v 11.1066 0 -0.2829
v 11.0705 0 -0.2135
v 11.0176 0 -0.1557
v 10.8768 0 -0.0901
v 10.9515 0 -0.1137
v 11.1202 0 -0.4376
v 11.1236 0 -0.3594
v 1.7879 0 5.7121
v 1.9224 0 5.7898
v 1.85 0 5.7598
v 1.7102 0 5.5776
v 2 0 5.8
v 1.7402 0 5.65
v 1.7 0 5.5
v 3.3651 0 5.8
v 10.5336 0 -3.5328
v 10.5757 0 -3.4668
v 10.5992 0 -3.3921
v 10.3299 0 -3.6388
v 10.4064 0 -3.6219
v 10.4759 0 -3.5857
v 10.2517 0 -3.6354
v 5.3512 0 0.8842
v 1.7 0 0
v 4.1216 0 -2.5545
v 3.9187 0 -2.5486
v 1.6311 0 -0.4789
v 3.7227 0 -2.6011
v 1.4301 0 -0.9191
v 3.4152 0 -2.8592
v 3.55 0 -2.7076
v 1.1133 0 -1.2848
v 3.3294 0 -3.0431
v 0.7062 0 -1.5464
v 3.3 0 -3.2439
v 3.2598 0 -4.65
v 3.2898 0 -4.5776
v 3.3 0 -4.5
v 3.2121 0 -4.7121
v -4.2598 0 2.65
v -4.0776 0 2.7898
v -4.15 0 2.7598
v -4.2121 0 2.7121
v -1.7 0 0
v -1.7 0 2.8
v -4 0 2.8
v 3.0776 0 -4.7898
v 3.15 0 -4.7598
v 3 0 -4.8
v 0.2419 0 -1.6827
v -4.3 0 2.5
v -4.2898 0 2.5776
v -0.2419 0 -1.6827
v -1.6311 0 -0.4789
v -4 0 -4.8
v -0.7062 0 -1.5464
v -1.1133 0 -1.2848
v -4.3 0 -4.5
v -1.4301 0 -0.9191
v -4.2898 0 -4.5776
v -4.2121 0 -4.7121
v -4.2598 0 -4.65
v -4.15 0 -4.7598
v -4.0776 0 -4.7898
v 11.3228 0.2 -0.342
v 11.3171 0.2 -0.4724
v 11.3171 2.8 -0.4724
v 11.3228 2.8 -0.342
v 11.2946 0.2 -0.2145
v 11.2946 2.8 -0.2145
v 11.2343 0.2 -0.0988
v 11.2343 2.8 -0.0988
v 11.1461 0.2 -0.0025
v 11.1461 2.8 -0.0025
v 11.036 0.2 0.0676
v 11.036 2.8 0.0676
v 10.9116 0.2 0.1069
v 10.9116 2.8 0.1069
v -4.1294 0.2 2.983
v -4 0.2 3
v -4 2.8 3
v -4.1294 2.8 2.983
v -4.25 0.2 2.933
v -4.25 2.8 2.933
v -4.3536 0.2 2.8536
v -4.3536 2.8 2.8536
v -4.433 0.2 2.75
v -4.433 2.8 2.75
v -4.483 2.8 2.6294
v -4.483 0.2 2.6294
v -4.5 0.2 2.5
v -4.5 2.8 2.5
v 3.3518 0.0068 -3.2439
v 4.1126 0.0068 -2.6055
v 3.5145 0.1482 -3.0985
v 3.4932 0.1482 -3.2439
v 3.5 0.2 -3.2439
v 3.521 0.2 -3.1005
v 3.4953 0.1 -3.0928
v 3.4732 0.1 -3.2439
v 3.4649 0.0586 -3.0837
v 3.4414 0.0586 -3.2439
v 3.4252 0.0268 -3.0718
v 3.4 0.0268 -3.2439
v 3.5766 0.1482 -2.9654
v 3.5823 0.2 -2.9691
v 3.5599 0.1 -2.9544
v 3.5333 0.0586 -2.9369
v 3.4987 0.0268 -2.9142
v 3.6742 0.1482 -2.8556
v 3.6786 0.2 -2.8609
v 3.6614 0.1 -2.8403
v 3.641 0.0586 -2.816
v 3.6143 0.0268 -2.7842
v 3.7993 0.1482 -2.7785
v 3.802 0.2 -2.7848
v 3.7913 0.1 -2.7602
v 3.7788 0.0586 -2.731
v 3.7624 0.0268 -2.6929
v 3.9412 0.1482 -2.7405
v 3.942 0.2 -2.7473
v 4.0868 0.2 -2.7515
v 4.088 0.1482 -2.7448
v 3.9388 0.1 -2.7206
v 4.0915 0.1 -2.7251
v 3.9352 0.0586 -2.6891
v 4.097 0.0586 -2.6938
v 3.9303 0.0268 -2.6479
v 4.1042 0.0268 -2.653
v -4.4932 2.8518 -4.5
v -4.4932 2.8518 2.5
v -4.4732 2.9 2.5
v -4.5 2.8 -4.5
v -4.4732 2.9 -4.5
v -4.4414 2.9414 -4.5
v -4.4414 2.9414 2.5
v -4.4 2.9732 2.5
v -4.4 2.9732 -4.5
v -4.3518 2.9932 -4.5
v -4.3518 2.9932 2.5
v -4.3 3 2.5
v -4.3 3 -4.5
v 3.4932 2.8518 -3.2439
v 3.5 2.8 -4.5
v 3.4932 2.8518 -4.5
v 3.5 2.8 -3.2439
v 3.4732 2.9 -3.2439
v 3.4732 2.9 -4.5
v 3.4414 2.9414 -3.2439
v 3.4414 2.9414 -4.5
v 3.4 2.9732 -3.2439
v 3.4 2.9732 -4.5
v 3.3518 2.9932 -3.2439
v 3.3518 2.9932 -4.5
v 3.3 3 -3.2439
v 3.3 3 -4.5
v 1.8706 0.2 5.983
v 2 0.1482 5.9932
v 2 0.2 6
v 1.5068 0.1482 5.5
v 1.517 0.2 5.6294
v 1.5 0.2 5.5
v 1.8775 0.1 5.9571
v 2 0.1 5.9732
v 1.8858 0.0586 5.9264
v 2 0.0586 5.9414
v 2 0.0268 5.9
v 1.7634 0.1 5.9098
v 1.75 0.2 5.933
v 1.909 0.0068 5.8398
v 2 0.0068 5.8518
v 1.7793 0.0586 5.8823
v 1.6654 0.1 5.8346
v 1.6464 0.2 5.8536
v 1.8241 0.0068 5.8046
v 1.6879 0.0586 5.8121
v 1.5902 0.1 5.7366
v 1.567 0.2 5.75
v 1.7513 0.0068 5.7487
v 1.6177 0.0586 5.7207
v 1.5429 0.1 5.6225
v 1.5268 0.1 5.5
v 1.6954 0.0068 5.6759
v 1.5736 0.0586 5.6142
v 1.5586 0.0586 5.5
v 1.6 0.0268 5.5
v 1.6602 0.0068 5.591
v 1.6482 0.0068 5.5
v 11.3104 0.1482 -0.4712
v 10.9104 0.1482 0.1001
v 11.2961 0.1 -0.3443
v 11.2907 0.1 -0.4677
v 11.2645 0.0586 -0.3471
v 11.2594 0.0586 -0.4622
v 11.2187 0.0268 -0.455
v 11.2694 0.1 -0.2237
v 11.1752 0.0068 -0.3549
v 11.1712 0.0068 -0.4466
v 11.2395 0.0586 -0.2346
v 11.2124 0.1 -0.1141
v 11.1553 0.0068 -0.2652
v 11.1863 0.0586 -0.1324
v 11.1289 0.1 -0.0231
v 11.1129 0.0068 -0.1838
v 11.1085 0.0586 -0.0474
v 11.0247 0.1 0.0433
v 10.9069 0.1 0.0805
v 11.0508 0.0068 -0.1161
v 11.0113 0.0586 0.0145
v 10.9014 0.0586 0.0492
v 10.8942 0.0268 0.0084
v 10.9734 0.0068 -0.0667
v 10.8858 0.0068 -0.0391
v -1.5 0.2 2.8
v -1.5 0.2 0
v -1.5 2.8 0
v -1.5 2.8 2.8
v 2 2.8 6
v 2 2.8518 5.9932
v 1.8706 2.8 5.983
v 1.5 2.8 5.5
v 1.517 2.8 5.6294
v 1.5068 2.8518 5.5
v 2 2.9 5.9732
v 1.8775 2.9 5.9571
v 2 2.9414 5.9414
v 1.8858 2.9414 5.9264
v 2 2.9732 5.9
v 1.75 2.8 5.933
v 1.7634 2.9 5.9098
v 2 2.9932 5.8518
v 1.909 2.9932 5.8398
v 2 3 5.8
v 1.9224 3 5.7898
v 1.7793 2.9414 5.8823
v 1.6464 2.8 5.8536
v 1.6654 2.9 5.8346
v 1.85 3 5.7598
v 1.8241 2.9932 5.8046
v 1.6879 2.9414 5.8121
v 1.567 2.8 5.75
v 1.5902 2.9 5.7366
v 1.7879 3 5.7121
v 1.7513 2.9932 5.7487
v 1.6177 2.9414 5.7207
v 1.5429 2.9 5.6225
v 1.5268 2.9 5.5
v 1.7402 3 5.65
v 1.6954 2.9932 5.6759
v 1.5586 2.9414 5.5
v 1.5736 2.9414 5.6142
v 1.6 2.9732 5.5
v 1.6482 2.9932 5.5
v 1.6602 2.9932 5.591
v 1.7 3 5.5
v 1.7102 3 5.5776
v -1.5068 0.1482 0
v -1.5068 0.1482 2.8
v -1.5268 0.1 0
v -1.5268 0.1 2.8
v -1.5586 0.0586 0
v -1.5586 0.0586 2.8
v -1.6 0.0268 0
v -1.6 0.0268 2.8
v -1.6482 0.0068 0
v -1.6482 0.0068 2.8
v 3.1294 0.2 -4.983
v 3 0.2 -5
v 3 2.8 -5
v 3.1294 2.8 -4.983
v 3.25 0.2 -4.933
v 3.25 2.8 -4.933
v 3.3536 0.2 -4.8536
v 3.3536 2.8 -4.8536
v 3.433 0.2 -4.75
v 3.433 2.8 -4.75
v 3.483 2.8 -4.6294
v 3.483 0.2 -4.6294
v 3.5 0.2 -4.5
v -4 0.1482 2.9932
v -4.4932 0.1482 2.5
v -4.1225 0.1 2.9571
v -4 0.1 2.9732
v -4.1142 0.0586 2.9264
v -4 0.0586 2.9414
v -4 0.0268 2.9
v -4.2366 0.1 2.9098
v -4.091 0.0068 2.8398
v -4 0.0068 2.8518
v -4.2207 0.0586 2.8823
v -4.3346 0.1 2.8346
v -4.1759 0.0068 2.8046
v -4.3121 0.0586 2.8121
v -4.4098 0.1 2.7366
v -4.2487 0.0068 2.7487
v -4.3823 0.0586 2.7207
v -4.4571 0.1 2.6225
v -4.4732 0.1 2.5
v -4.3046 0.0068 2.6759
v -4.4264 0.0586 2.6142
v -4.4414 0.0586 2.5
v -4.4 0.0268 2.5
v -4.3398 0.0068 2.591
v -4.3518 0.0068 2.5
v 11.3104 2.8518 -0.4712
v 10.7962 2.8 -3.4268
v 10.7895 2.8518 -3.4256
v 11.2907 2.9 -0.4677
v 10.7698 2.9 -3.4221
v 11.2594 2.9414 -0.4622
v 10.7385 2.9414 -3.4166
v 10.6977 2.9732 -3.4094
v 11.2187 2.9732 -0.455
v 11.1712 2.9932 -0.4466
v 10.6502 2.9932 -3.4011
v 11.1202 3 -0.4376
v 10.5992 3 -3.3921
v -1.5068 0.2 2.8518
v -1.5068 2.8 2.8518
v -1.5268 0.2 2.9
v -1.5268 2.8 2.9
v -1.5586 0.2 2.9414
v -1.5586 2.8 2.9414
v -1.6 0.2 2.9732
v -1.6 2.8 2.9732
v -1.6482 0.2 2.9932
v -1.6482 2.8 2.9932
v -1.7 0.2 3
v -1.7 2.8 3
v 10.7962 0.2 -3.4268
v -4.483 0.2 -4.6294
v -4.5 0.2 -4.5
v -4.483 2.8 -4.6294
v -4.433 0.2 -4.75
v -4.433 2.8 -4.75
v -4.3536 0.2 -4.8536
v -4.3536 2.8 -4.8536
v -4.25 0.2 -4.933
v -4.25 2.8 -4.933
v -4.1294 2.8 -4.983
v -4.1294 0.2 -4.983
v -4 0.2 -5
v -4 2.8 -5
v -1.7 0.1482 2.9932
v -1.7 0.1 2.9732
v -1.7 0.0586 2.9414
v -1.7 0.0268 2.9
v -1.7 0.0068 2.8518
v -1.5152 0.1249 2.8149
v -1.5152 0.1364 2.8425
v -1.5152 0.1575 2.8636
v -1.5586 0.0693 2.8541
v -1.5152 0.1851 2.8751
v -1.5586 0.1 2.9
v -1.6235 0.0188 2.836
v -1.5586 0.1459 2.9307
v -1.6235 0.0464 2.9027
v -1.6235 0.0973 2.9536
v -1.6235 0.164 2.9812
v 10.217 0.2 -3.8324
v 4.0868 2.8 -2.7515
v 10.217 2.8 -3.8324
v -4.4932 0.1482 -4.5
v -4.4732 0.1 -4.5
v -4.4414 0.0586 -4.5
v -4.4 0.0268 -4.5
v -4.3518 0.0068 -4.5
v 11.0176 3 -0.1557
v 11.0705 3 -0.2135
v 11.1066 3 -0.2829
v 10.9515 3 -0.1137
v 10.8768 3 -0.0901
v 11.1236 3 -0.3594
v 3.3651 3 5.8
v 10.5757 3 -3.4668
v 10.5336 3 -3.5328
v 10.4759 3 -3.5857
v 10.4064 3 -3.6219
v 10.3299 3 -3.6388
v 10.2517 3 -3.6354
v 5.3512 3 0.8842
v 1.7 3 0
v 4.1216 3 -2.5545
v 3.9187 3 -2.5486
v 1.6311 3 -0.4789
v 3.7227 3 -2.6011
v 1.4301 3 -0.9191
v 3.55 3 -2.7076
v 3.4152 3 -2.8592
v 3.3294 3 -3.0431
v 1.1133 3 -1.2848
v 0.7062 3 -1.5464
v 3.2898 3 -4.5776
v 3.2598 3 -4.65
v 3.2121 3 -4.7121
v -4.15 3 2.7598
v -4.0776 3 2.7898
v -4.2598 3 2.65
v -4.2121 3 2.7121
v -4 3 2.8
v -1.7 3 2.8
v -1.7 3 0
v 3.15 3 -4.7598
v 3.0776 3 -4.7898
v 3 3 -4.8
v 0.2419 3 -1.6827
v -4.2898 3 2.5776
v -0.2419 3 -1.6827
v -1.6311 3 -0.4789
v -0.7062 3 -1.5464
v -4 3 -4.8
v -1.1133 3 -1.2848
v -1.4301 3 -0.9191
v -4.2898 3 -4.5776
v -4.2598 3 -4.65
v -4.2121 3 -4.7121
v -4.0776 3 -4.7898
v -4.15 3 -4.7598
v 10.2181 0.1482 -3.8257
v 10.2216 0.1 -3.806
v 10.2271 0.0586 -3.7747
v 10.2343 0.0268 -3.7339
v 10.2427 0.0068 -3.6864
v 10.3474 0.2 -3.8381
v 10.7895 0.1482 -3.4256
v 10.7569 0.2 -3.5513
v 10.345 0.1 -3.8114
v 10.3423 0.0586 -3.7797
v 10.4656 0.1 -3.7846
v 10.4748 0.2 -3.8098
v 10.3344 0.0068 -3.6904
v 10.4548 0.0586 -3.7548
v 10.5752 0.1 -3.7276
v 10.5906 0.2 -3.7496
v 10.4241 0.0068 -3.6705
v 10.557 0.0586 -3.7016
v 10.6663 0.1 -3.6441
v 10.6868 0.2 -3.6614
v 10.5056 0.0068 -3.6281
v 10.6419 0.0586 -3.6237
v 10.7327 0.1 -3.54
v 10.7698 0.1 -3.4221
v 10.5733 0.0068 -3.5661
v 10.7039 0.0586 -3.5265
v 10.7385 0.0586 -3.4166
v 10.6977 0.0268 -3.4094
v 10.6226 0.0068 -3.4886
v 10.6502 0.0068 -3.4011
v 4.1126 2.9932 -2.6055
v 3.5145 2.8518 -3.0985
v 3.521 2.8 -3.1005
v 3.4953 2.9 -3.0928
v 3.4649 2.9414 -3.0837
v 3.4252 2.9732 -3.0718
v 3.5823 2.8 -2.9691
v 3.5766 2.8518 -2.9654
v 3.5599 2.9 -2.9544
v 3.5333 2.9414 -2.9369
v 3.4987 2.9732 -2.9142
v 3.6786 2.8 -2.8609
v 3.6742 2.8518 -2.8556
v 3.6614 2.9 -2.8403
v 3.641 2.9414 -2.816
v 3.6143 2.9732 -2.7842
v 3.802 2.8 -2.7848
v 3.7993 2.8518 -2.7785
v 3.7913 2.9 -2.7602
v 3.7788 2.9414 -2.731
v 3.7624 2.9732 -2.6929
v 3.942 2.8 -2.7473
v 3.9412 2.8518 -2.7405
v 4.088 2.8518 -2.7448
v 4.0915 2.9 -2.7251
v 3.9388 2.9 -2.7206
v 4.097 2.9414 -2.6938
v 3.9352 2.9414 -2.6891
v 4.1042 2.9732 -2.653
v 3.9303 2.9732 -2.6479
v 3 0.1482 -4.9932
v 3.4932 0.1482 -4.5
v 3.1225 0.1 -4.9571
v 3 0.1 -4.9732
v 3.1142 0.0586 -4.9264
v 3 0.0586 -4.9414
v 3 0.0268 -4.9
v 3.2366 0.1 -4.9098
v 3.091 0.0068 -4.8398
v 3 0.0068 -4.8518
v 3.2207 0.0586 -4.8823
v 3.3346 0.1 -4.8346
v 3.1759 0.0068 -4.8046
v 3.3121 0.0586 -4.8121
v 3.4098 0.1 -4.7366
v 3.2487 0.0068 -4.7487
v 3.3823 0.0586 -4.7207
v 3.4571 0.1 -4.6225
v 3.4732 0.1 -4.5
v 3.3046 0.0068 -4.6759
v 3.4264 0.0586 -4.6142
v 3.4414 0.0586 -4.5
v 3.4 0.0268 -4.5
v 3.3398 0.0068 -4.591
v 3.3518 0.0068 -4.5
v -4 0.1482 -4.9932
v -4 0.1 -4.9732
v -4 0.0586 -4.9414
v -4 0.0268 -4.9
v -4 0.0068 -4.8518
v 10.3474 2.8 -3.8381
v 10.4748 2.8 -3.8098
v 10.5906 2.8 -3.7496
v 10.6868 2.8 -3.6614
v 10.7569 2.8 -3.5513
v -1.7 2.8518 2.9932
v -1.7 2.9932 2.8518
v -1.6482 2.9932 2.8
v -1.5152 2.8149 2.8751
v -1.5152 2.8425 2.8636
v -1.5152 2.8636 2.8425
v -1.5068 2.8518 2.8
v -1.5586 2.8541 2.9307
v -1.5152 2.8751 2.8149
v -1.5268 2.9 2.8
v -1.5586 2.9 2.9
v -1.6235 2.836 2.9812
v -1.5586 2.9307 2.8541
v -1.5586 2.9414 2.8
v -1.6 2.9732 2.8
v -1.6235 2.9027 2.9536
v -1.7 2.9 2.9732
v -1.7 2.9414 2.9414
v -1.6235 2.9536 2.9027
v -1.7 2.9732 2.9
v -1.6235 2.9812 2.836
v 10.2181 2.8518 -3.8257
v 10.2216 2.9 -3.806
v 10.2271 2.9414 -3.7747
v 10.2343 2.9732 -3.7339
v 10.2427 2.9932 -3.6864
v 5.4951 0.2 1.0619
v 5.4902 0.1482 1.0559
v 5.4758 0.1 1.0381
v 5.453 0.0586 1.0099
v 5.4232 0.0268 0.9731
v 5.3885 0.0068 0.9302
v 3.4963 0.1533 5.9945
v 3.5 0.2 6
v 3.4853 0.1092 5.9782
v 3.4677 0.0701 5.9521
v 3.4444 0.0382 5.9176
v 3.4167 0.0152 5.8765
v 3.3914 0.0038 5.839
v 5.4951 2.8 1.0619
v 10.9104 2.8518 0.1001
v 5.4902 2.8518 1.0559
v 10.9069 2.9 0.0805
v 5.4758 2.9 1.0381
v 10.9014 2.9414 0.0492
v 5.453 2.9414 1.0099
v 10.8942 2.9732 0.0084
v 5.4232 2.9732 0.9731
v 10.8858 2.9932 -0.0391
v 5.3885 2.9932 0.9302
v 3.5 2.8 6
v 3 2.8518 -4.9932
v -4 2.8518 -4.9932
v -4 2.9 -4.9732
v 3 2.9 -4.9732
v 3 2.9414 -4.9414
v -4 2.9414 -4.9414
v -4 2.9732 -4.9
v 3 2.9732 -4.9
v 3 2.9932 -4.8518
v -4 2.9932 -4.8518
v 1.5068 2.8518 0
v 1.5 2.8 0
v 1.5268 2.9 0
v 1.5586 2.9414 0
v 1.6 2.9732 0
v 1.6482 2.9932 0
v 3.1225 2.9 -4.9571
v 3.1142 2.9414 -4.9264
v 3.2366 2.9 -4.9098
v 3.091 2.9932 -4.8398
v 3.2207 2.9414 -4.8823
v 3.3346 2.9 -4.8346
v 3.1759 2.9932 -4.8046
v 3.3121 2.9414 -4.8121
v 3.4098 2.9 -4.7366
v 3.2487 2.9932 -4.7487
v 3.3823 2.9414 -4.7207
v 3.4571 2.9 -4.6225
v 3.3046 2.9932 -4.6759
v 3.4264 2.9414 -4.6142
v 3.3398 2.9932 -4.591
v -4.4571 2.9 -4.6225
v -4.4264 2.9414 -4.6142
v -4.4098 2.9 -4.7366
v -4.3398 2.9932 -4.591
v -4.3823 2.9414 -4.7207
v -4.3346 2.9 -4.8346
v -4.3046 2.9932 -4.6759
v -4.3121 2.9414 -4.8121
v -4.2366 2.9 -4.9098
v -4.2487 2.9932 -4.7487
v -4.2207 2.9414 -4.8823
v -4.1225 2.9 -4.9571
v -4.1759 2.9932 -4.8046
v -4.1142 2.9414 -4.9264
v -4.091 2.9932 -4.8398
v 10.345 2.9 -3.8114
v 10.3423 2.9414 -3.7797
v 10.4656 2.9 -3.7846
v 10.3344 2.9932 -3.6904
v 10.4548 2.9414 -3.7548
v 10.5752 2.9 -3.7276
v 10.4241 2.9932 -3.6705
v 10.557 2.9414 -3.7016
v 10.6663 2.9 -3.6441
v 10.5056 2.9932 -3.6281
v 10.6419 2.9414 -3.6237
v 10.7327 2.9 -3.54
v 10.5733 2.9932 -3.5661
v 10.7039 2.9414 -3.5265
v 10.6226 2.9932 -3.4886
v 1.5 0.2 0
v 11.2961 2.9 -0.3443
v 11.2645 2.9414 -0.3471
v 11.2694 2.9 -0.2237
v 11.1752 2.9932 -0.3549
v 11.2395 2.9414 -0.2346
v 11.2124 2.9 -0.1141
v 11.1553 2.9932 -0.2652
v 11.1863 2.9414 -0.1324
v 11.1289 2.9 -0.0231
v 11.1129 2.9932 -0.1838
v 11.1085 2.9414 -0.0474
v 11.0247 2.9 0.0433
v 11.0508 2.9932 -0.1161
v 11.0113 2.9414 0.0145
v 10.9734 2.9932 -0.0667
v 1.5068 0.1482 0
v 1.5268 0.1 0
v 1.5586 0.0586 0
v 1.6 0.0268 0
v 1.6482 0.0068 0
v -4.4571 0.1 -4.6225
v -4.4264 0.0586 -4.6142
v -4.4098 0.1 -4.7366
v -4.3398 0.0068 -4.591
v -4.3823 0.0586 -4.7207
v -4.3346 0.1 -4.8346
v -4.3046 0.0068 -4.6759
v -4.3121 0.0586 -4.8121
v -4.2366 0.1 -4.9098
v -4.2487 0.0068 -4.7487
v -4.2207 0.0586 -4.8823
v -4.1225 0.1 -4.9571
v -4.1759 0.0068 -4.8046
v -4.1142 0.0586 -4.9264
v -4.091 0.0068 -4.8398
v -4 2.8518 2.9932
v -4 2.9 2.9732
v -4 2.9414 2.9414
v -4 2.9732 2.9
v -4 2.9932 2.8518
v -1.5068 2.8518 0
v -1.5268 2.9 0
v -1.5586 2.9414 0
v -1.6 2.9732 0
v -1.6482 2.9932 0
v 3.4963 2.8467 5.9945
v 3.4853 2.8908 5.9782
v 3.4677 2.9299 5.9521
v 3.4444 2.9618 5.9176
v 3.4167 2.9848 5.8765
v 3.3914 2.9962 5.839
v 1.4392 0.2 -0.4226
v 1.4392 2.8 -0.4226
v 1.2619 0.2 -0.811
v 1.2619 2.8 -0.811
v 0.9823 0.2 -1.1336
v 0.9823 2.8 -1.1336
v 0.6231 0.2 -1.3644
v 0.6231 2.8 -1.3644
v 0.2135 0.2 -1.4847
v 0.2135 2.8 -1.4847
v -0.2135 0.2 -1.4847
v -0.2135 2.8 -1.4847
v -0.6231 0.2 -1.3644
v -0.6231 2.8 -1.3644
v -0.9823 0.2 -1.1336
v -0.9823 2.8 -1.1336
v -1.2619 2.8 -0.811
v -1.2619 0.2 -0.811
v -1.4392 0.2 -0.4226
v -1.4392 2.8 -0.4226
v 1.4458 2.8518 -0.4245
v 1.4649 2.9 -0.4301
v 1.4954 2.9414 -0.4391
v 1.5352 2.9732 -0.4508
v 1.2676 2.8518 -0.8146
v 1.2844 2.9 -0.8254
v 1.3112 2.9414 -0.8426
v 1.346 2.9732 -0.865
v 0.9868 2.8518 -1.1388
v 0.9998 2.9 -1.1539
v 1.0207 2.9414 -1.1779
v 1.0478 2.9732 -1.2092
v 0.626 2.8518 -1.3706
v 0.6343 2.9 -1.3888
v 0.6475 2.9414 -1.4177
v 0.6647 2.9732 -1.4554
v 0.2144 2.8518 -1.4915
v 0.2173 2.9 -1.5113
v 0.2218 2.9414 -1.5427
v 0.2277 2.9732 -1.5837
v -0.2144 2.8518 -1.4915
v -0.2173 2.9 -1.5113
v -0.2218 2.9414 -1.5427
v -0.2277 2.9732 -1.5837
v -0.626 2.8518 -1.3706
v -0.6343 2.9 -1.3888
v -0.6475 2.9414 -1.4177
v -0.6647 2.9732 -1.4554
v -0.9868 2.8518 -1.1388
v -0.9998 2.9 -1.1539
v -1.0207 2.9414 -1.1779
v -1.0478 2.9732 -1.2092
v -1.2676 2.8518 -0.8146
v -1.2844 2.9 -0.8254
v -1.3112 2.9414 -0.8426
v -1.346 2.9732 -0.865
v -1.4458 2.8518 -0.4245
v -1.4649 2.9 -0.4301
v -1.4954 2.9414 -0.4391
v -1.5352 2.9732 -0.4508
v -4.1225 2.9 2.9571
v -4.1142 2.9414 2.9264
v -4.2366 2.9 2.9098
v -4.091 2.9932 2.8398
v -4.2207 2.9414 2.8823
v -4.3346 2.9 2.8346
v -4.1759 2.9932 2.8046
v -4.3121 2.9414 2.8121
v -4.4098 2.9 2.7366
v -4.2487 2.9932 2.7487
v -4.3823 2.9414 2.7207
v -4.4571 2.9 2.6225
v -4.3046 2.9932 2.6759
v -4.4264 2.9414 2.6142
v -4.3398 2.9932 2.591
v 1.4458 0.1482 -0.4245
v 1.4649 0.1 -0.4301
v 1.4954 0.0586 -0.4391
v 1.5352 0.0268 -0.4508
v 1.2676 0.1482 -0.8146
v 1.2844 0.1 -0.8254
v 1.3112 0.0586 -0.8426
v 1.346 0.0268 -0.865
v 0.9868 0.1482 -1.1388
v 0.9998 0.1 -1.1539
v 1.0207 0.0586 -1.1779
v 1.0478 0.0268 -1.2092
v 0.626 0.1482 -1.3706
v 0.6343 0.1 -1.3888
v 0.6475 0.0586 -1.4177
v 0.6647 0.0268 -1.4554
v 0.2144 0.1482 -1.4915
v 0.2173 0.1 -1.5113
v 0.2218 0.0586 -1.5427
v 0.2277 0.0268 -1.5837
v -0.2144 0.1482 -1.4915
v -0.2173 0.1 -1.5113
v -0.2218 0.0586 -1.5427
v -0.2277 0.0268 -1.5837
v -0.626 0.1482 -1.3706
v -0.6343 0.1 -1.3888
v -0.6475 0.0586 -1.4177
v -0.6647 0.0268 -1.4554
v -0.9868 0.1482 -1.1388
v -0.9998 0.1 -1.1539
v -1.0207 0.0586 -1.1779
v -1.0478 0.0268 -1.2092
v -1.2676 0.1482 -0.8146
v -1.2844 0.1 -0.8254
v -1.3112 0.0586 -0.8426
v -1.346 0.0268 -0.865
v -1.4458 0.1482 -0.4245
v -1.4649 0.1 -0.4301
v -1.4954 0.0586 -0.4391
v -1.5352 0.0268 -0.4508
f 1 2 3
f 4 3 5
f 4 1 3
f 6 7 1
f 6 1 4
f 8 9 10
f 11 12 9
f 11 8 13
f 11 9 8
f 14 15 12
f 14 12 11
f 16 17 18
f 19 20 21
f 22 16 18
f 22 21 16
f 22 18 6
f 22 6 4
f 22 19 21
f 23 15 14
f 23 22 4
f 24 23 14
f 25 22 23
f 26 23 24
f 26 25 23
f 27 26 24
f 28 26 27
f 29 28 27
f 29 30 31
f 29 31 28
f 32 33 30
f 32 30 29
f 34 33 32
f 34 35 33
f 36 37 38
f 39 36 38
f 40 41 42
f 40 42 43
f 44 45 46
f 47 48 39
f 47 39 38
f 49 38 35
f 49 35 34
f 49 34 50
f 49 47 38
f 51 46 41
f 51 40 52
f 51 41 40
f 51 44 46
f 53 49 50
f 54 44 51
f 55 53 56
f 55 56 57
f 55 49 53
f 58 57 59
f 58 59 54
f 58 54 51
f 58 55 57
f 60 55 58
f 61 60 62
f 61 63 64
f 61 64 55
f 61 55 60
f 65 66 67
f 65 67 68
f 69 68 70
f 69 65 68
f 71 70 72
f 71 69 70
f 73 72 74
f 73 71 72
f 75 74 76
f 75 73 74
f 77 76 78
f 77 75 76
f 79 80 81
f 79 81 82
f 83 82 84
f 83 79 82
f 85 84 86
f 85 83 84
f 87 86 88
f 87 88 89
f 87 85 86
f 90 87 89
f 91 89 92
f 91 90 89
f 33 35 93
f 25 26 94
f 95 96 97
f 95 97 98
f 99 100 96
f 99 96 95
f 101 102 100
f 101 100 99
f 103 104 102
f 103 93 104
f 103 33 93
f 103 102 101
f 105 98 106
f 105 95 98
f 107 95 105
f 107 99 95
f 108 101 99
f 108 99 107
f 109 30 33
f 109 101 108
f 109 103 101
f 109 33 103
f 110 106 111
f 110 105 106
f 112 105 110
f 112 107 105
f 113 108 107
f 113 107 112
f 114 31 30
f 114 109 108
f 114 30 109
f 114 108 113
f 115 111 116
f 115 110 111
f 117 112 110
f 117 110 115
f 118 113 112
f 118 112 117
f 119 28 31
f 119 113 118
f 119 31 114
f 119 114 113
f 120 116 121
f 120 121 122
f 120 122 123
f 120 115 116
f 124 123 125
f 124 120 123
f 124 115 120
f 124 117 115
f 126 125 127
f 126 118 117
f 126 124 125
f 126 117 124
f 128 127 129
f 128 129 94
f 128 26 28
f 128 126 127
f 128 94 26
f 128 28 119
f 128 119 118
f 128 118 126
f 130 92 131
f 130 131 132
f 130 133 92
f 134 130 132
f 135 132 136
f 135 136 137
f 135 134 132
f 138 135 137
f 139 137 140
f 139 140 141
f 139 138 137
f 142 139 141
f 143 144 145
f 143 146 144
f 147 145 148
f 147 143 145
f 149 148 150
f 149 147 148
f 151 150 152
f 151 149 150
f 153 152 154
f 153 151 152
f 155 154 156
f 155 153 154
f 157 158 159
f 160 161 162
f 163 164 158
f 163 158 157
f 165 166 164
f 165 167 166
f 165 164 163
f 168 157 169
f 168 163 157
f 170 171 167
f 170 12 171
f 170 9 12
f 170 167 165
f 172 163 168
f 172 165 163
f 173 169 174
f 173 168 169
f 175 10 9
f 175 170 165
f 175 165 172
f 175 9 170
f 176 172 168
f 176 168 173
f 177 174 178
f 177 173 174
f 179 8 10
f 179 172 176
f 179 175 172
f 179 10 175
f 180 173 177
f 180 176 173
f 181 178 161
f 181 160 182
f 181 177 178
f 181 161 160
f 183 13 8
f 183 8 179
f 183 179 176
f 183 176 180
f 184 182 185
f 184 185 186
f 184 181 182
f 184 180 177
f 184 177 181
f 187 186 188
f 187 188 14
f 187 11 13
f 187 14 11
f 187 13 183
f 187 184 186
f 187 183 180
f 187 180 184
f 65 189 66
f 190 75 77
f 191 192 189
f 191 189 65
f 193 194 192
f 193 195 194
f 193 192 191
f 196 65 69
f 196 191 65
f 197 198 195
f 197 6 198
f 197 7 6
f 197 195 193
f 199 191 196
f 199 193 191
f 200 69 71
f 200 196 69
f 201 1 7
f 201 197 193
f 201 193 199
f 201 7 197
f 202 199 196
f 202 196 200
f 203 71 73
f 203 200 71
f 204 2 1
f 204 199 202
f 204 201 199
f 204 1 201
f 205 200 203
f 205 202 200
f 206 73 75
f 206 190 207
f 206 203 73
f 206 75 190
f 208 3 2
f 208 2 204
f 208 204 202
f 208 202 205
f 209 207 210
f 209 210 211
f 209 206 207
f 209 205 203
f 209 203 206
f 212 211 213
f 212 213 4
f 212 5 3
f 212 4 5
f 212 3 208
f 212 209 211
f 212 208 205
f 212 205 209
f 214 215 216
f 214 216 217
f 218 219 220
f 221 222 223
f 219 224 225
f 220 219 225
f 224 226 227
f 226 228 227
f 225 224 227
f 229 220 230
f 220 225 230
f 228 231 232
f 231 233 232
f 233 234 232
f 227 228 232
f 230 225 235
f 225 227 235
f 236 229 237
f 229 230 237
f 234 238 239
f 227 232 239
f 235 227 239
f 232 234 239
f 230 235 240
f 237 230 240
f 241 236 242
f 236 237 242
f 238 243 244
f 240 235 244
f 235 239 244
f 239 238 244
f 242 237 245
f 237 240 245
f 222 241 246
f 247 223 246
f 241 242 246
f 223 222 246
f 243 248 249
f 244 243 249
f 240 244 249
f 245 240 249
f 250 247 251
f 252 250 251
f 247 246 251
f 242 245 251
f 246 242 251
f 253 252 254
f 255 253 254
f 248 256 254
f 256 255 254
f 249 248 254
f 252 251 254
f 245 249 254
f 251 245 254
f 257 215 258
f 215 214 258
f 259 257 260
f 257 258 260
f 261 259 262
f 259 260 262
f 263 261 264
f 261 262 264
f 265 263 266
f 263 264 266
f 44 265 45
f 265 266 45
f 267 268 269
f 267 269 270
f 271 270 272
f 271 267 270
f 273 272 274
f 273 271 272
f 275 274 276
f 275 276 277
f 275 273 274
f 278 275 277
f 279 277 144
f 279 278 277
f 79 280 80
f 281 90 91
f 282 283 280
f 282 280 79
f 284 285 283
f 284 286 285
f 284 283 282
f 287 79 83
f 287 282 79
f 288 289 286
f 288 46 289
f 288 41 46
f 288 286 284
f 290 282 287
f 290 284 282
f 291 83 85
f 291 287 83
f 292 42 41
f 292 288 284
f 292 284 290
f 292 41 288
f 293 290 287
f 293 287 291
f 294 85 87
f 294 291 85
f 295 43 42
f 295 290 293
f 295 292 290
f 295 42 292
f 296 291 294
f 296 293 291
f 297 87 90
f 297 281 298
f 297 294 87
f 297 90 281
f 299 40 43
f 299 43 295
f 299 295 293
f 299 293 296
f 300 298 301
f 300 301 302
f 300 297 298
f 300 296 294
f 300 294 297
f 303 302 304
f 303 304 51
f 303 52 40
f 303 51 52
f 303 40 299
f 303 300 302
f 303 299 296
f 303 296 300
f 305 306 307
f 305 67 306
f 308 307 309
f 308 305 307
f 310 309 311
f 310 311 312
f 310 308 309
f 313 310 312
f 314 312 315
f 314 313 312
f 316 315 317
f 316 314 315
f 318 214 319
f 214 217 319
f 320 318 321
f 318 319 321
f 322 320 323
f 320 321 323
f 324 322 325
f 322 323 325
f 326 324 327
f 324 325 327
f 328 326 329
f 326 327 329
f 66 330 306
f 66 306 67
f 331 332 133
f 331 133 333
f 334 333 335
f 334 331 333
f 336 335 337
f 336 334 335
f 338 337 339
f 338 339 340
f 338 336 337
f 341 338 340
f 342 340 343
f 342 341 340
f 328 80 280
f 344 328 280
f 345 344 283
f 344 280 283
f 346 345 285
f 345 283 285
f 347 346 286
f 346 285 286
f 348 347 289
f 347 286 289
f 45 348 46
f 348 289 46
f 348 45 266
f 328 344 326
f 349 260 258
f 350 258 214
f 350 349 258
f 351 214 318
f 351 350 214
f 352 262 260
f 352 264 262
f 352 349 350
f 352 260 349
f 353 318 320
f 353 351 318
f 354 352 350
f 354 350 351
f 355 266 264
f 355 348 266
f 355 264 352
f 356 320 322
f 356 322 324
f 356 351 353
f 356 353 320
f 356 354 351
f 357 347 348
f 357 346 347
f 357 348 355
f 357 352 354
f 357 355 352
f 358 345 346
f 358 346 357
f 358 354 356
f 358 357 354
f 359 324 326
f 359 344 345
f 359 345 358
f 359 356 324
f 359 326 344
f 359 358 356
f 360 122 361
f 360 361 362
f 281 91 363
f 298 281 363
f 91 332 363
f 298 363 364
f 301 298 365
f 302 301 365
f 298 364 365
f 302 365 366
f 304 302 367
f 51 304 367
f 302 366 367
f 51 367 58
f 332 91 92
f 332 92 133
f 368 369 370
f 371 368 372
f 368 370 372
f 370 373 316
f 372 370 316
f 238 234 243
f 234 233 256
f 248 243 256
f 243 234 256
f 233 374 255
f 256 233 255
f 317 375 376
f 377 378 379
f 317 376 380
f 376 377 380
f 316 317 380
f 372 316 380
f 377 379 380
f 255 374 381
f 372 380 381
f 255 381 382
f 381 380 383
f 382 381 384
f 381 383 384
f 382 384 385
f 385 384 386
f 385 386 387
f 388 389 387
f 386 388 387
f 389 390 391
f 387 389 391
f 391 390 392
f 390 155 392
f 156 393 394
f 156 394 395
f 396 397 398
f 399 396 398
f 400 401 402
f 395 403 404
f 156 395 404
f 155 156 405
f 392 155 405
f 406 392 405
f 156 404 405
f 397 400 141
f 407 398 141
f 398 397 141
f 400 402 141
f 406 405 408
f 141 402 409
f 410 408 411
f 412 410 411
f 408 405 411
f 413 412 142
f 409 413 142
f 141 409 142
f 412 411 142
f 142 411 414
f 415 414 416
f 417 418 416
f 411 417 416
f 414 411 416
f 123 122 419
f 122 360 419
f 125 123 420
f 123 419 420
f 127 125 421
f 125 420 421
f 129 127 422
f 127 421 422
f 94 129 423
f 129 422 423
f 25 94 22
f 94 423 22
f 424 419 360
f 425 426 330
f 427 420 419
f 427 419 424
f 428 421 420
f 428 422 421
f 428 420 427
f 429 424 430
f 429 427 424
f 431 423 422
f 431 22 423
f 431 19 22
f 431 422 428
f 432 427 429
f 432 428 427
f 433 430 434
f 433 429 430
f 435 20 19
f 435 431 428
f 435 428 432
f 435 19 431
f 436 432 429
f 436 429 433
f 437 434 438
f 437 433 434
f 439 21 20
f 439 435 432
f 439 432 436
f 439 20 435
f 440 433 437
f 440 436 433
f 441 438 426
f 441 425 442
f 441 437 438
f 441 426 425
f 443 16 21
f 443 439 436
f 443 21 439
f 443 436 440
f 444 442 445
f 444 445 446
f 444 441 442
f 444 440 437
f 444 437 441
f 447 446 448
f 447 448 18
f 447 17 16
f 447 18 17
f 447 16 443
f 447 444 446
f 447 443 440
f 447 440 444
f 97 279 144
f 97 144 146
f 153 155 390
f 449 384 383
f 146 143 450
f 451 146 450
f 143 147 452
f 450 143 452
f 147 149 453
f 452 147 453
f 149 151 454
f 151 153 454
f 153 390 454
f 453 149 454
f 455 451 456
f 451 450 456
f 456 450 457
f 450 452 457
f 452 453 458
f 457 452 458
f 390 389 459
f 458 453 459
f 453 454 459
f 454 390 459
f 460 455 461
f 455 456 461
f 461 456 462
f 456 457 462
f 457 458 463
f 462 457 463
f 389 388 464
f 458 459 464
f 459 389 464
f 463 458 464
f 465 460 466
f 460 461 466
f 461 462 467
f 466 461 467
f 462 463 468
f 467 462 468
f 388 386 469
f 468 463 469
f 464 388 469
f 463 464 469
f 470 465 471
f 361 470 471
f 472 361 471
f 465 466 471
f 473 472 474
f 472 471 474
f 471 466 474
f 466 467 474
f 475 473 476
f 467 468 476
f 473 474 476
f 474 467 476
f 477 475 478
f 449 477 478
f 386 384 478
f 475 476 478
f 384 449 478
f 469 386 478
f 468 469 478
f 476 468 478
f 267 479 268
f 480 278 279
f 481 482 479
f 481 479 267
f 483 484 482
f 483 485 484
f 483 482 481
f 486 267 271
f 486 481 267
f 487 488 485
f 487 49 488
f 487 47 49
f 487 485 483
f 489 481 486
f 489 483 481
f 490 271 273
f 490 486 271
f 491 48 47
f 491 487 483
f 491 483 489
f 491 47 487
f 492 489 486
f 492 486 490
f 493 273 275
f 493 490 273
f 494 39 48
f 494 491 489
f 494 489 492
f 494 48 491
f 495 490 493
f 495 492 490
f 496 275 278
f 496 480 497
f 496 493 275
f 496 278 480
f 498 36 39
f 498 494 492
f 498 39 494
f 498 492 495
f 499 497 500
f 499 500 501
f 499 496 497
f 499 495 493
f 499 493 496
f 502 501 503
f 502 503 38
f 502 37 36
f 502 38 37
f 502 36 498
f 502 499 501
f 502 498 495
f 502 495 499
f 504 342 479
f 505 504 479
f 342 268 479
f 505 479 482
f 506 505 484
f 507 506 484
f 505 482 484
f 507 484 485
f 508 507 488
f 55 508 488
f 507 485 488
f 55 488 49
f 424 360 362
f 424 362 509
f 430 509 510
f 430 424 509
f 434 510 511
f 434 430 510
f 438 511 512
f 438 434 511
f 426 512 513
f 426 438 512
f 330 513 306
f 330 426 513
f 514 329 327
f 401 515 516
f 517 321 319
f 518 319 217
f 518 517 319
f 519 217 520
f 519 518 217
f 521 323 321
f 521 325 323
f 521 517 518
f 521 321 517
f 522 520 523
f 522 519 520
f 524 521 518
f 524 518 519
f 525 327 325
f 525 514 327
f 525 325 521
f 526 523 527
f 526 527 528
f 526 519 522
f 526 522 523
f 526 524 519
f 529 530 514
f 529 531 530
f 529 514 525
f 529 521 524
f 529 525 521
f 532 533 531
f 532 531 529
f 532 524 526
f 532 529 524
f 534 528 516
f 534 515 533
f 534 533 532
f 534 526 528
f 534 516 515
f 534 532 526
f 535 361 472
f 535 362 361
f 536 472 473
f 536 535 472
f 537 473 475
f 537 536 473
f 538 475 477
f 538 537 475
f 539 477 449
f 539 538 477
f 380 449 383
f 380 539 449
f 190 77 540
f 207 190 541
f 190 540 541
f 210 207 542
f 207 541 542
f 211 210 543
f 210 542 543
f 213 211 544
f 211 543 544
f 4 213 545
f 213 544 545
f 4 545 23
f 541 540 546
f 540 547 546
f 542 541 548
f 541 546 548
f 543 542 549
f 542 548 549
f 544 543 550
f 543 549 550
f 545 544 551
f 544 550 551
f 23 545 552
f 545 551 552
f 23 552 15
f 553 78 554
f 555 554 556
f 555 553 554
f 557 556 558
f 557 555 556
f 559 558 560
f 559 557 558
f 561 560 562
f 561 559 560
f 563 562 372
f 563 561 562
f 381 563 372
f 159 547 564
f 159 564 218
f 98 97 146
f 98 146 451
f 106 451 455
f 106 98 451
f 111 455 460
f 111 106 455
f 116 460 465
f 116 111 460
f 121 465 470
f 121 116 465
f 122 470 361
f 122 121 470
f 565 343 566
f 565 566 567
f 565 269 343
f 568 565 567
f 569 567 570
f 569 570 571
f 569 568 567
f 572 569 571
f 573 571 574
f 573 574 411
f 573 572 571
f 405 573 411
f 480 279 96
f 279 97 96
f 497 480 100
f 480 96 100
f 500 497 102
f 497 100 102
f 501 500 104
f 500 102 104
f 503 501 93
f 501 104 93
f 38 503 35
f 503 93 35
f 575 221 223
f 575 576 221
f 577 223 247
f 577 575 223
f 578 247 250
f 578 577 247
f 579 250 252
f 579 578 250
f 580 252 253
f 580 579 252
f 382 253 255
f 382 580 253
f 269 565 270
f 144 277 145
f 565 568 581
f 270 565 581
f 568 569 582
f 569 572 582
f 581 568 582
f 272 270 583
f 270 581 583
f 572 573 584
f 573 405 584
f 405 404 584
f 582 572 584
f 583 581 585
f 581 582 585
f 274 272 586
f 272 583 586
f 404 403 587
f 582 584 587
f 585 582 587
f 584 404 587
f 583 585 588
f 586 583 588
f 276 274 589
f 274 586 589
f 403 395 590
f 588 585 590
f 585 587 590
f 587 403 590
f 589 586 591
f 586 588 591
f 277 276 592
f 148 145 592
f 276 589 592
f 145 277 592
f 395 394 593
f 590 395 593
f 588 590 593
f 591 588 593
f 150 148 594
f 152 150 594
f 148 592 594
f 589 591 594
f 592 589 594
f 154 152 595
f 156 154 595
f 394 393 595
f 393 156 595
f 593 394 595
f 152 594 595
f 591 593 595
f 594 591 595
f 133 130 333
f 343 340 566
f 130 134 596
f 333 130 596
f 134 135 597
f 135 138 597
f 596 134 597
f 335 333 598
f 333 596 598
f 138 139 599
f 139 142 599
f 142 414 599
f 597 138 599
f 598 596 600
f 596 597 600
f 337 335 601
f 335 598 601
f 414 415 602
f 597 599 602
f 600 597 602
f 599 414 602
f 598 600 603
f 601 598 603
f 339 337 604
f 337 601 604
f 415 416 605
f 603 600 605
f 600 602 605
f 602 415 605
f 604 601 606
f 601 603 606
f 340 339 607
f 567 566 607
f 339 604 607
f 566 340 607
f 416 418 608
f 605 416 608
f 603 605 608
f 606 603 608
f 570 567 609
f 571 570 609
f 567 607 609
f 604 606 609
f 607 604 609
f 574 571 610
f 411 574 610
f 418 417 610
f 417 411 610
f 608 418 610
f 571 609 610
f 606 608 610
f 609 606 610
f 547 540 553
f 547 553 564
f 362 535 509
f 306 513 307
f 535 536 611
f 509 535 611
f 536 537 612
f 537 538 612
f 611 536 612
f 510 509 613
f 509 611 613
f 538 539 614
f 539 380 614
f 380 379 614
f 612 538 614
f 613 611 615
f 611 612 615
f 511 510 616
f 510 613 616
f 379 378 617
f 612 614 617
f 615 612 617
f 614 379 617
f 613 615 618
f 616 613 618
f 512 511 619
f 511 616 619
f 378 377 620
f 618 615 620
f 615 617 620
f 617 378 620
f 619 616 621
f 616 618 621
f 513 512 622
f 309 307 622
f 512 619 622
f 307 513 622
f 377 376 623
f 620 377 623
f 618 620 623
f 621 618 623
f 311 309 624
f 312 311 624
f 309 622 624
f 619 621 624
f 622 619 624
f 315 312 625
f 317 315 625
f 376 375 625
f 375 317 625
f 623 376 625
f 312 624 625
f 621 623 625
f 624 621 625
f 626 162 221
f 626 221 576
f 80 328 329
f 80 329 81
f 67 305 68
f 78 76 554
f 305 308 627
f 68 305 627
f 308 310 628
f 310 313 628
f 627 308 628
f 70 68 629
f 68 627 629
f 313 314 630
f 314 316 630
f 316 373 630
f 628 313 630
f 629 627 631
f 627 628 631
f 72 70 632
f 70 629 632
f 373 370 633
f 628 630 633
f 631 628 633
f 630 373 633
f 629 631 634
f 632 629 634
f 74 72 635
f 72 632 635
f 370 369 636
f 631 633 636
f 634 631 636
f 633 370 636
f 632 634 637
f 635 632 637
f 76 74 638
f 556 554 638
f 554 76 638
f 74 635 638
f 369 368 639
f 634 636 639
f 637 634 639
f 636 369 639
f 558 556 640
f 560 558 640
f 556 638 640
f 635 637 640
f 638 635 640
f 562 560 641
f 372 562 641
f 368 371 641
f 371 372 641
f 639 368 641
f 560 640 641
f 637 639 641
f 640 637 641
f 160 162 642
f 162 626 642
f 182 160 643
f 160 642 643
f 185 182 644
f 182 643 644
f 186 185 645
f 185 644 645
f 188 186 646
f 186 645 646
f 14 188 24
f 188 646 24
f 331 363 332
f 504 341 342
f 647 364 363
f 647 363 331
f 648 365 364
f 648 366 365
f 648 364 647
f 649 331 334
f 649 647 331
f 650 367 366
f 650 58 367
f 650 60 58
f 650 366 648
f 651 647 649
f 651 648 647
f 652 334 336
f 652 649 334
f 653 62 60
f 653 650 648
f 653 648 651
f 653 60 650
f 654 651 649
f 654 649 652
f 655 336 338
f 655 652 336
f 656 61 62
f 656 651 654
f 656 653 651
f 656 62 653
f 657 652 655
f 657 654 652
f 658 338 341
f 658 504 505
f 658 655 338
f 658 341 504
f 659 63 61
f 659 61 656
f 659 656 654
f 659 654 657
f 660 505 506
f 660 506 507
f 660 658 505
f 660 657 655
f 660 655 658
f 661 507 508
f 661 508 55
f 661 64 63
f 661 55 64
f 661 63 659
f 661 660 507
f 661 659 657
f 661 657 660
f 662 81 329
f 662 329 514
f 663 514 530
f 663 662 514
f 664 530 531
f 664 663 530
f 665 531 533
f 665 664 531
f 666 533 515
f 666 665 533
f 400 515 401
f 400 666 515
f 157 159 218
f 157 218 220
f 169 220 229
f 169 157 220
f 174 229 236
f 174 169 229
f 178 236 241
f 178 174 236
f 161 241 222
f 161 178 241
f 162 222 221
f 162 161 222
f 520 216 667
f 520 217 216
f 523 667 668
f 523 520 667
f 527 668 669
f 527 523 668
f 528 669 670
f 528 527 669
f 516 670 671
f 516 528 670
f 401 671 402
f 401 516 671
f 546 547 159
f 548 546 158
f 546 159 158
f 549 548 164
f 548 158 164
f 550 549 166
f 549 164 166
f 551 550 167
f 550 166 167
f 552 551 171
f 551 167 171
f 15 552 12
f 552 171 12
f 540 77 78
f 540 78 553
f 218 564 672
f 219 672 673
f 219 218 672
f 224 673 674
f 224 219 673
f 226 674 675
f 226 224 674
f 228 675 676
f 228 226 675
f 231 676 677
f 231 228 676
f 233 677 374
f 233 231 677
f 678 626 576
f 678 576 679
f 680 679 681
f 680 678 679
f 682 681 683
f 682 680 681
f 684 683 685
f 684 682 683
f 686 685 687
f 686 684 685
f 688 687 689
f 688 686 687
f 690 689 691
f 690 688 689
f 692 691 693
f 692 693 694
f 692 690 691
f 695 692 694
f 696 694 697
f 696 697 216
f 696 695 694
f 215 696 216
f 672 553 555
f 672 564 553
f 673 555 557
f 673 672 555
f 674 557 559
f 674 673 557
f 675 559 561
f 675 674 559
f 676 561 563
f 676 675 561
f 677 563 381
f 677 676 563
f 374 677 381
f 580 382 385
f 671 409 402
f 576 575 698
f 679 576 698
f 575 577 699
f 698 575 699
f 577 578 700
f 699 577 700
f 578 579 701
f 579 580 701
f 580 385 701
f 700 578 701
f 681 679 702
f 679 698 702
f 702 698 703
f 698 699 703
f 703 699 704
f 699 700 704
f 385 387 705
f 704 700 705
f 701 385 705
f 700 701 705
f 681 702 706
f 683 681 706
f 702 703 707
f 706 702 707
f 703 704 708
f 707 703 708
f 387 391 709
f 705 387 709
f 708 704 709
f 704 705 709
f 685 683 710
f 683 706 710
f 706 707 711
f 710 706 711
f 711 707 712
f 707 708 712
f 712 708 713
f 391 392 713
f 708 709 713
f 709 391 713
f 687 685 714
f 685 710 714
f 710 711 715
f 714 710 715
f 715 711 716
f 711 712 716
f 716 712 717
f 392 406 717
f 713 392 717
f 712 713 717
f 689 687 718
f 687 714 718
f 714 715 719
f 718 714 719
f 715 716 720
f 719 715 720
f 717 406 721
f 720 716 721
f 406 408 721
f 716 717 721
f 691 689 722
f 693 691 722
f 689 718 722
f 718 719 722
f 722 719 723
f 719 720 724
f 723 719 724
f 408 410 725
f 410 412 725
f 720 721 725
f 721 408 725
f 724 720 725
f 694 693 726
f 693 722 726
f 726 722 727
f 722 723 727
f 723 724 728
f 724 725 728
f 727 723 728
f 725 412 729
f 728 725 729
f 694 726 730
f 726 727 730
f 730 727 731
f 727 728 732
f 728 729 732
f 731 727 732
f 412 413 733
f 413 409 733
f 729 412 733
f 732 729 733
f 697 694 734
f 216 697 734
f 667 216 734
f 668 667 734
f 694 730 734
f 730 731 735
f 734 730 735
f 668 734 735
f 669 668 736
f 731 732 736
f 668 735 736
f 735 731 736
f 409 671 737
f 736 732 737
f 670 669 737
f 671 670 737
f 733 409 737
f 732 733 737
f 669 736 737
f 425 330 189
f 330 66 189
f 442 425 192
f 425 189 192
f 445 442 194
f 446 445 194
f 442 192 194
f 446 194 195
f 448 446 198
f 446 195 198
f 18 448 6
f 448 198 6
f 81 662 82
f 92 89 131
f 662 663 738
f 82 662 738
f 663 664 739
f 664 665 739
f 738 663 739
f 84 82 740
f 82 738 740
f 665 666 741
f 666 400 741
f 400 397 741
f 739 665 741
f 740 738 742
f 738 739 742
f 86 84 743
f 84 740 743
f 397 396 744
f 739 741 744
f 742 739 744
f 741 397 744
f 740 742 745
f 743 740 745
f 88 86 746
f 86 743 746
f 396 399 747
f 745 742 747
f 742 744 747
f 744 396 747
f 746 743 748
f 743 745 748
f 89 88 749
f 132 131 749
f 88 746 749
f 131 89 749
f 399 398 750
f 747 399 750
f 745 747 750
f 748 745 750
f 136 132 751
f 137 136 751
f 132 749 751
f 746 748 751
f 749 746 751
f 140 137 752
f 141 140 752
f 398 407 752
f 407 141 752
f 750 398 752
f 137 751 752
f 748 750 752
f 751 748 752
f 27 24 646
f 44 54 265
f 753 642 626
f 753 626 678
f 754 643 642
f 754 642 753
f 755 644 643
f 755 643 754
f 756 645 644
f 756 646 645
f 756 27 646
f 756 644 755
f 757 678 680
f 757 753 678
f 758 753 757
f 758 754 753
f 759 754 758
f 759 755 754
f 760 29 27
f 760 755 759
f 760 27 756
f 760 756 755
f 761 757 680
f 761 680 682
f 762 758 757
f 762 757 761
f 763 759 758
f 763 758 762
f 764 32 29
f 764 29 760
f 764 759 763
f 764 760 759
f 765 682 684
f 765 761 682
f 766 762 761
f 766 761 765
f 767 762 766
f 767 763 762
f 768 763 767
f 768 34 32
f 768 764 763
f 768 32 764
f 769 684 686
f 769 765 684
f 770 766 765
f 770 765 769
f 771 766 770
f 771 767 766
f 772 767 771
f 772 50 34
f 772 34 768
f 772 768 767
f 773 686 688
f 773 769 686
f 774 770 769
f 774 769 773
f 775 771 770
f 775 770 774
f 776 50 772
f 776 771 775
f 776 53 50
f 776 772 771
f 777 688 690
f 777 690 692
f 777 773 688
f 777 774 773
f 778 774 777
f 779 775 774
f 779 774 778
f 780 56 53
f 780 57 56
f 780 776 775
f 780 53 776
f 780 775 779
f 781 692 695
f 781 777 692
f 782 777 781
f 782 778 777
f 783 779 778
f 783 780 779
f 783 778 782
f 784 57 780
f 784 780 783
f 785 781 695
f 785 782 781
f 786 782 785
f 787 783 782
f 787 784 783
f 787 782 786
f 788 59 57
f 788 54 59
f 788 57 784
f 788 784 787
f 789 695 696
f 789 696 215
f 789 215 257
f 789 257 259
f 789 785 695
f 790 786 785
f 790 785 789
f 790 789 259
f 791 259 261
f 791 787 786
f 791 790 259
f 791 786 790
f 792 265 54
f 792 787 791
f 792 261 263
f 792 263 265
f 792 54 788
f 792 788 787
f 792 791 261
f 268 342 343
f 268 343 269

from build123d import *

# Parameters (mm, degrees)
BOSS_EXTRUDE1_DEPTH = 3
FILLET1_R           = 0.2


with BuildPart() as part:
    # Sketch1 → Boss-Extrude1 (new body)
    with BuildSketch(Plane(origin=(0, 0, 0), x_dir=(1, 0, 0), z_dir=(0, 1, 0))):
        with BuildLine():
            Line((-1.5, 0), (-1.5, -3))
            Line((-1.5, -3), (-4, -3))
            ThreePointArc((-4, -3), (-4.353553391, -2.853553391), (-4.5, -2.5))
            Line((-4.5, -2.5), (-4.5, 4.5))
            ThreePointArc((-4.5, 4.5), (-4.353553391, 4.853553391), (-4, 5))
            Line((-4, 5), (3, 5))
            ThreePointArc((3, 5), (3.353553391, 4.853553391), (3.5, 4.5))
            Line((3.5, 4.5), (3.5, 3.243874453))
            ThreePointArc((3.5, 3.243874453), (3.678606195, 2.860852231), (4.086824089, 2.751470576))
            Line((4.086824089, 2.751470576), (10.216965325, 3.832379871))
            ThreePointArc((10.216965325, 3.832379871), (10.590577632, 3.749552017), (10.79619329, 3.426800084))
            Line((10.79619329, 3.426800084), (11.317137823, 0.472376825))
            ThreePointArc((11.317137823, 0.472376825), (11.234309969, 0.098764518), (10.911558035, -0.106851141))
            Line((10.911558035, -0.106851141), (5.495115394, -1.061916118))
            Line((5.495115394, -1.061916118), (3.5, -6))
            Line((3.5, -6), (2, -6))
            ThreePointArc((2, -6), (1.646446609, -5.853553391), (1.5, -5.5))
            Line((1.5, -5.5), (1.5, 0))
            ThreePointArc((1.5, 0), (0, 1.5), (-1.5, 0))
        make_face()
    extrude(amount=BOSS_EXTRUDE1_DEPTH)

    # Fillet1
    fillet1_edges = [part.edges().sort_by_distance(p)[0] for p in [
        (3.353553391, 3, -4.853553391),
        (-0.5, 3, -5),
        (7.151894707, 0, -3.291925224),
        (10.590577632, 0, -3.749552017),
        (11.056665557, 0, -1.949588454),
        (11.234309969, 0, -0.098764518),
        (8.203336715, 0, 0.584383629),
        (-4.353553391, 3, -4.853553391),
        (4.497557697, 0, 3.530958059),
        (2.75, 0, 6),
        (1.646446609, 0, 5.853553391),
        (1.5, 0, 2.75),
        (0, 0, -1.5),
        (-1.5, 0, 1.5),
        (-2.75, 0, 3),
        (-4.353553391, 0, 2.853553391),
        (-4.5, 3, -1),
        (-4.5, 0, -1),
        (-4.353553391, 0, -4.853553391),
        (-0.5, 0, -5),
        (3.353553391, 0, -4.853553391),
        (3.5, 0, -3.871937226),
        (3.678606195, 0, -2.860852231),
        (-4.353553391, 3, 2.853553391),
        (-2.75, 3, 3),
        (-1.5, 1.5, 3),
        (-1.5, 3, 1.5),
        (0, 3, -1.5),
        (1.5, 3, 2.75),
        (1.646446609, 3, 5.853553391),
        (3.678606195, 3, -2.860852231),
        (2.75, 3, 6),
        (4.497557697, 3, 3.530958059),
        (8.203336715, 3, 0.584383629),
        (11.234309969, 3, -0.098764518),
        (11.056665557, 3, -1.949588454),
        (10.590577632, 3, -3.749552017),
        (7.151894707, 3, -3.291925224),
        (3.5, 3, -3.871937226),
    ]]
    fillet(fillet1_edges, radius=FILLET1_R)


solid = part.part
